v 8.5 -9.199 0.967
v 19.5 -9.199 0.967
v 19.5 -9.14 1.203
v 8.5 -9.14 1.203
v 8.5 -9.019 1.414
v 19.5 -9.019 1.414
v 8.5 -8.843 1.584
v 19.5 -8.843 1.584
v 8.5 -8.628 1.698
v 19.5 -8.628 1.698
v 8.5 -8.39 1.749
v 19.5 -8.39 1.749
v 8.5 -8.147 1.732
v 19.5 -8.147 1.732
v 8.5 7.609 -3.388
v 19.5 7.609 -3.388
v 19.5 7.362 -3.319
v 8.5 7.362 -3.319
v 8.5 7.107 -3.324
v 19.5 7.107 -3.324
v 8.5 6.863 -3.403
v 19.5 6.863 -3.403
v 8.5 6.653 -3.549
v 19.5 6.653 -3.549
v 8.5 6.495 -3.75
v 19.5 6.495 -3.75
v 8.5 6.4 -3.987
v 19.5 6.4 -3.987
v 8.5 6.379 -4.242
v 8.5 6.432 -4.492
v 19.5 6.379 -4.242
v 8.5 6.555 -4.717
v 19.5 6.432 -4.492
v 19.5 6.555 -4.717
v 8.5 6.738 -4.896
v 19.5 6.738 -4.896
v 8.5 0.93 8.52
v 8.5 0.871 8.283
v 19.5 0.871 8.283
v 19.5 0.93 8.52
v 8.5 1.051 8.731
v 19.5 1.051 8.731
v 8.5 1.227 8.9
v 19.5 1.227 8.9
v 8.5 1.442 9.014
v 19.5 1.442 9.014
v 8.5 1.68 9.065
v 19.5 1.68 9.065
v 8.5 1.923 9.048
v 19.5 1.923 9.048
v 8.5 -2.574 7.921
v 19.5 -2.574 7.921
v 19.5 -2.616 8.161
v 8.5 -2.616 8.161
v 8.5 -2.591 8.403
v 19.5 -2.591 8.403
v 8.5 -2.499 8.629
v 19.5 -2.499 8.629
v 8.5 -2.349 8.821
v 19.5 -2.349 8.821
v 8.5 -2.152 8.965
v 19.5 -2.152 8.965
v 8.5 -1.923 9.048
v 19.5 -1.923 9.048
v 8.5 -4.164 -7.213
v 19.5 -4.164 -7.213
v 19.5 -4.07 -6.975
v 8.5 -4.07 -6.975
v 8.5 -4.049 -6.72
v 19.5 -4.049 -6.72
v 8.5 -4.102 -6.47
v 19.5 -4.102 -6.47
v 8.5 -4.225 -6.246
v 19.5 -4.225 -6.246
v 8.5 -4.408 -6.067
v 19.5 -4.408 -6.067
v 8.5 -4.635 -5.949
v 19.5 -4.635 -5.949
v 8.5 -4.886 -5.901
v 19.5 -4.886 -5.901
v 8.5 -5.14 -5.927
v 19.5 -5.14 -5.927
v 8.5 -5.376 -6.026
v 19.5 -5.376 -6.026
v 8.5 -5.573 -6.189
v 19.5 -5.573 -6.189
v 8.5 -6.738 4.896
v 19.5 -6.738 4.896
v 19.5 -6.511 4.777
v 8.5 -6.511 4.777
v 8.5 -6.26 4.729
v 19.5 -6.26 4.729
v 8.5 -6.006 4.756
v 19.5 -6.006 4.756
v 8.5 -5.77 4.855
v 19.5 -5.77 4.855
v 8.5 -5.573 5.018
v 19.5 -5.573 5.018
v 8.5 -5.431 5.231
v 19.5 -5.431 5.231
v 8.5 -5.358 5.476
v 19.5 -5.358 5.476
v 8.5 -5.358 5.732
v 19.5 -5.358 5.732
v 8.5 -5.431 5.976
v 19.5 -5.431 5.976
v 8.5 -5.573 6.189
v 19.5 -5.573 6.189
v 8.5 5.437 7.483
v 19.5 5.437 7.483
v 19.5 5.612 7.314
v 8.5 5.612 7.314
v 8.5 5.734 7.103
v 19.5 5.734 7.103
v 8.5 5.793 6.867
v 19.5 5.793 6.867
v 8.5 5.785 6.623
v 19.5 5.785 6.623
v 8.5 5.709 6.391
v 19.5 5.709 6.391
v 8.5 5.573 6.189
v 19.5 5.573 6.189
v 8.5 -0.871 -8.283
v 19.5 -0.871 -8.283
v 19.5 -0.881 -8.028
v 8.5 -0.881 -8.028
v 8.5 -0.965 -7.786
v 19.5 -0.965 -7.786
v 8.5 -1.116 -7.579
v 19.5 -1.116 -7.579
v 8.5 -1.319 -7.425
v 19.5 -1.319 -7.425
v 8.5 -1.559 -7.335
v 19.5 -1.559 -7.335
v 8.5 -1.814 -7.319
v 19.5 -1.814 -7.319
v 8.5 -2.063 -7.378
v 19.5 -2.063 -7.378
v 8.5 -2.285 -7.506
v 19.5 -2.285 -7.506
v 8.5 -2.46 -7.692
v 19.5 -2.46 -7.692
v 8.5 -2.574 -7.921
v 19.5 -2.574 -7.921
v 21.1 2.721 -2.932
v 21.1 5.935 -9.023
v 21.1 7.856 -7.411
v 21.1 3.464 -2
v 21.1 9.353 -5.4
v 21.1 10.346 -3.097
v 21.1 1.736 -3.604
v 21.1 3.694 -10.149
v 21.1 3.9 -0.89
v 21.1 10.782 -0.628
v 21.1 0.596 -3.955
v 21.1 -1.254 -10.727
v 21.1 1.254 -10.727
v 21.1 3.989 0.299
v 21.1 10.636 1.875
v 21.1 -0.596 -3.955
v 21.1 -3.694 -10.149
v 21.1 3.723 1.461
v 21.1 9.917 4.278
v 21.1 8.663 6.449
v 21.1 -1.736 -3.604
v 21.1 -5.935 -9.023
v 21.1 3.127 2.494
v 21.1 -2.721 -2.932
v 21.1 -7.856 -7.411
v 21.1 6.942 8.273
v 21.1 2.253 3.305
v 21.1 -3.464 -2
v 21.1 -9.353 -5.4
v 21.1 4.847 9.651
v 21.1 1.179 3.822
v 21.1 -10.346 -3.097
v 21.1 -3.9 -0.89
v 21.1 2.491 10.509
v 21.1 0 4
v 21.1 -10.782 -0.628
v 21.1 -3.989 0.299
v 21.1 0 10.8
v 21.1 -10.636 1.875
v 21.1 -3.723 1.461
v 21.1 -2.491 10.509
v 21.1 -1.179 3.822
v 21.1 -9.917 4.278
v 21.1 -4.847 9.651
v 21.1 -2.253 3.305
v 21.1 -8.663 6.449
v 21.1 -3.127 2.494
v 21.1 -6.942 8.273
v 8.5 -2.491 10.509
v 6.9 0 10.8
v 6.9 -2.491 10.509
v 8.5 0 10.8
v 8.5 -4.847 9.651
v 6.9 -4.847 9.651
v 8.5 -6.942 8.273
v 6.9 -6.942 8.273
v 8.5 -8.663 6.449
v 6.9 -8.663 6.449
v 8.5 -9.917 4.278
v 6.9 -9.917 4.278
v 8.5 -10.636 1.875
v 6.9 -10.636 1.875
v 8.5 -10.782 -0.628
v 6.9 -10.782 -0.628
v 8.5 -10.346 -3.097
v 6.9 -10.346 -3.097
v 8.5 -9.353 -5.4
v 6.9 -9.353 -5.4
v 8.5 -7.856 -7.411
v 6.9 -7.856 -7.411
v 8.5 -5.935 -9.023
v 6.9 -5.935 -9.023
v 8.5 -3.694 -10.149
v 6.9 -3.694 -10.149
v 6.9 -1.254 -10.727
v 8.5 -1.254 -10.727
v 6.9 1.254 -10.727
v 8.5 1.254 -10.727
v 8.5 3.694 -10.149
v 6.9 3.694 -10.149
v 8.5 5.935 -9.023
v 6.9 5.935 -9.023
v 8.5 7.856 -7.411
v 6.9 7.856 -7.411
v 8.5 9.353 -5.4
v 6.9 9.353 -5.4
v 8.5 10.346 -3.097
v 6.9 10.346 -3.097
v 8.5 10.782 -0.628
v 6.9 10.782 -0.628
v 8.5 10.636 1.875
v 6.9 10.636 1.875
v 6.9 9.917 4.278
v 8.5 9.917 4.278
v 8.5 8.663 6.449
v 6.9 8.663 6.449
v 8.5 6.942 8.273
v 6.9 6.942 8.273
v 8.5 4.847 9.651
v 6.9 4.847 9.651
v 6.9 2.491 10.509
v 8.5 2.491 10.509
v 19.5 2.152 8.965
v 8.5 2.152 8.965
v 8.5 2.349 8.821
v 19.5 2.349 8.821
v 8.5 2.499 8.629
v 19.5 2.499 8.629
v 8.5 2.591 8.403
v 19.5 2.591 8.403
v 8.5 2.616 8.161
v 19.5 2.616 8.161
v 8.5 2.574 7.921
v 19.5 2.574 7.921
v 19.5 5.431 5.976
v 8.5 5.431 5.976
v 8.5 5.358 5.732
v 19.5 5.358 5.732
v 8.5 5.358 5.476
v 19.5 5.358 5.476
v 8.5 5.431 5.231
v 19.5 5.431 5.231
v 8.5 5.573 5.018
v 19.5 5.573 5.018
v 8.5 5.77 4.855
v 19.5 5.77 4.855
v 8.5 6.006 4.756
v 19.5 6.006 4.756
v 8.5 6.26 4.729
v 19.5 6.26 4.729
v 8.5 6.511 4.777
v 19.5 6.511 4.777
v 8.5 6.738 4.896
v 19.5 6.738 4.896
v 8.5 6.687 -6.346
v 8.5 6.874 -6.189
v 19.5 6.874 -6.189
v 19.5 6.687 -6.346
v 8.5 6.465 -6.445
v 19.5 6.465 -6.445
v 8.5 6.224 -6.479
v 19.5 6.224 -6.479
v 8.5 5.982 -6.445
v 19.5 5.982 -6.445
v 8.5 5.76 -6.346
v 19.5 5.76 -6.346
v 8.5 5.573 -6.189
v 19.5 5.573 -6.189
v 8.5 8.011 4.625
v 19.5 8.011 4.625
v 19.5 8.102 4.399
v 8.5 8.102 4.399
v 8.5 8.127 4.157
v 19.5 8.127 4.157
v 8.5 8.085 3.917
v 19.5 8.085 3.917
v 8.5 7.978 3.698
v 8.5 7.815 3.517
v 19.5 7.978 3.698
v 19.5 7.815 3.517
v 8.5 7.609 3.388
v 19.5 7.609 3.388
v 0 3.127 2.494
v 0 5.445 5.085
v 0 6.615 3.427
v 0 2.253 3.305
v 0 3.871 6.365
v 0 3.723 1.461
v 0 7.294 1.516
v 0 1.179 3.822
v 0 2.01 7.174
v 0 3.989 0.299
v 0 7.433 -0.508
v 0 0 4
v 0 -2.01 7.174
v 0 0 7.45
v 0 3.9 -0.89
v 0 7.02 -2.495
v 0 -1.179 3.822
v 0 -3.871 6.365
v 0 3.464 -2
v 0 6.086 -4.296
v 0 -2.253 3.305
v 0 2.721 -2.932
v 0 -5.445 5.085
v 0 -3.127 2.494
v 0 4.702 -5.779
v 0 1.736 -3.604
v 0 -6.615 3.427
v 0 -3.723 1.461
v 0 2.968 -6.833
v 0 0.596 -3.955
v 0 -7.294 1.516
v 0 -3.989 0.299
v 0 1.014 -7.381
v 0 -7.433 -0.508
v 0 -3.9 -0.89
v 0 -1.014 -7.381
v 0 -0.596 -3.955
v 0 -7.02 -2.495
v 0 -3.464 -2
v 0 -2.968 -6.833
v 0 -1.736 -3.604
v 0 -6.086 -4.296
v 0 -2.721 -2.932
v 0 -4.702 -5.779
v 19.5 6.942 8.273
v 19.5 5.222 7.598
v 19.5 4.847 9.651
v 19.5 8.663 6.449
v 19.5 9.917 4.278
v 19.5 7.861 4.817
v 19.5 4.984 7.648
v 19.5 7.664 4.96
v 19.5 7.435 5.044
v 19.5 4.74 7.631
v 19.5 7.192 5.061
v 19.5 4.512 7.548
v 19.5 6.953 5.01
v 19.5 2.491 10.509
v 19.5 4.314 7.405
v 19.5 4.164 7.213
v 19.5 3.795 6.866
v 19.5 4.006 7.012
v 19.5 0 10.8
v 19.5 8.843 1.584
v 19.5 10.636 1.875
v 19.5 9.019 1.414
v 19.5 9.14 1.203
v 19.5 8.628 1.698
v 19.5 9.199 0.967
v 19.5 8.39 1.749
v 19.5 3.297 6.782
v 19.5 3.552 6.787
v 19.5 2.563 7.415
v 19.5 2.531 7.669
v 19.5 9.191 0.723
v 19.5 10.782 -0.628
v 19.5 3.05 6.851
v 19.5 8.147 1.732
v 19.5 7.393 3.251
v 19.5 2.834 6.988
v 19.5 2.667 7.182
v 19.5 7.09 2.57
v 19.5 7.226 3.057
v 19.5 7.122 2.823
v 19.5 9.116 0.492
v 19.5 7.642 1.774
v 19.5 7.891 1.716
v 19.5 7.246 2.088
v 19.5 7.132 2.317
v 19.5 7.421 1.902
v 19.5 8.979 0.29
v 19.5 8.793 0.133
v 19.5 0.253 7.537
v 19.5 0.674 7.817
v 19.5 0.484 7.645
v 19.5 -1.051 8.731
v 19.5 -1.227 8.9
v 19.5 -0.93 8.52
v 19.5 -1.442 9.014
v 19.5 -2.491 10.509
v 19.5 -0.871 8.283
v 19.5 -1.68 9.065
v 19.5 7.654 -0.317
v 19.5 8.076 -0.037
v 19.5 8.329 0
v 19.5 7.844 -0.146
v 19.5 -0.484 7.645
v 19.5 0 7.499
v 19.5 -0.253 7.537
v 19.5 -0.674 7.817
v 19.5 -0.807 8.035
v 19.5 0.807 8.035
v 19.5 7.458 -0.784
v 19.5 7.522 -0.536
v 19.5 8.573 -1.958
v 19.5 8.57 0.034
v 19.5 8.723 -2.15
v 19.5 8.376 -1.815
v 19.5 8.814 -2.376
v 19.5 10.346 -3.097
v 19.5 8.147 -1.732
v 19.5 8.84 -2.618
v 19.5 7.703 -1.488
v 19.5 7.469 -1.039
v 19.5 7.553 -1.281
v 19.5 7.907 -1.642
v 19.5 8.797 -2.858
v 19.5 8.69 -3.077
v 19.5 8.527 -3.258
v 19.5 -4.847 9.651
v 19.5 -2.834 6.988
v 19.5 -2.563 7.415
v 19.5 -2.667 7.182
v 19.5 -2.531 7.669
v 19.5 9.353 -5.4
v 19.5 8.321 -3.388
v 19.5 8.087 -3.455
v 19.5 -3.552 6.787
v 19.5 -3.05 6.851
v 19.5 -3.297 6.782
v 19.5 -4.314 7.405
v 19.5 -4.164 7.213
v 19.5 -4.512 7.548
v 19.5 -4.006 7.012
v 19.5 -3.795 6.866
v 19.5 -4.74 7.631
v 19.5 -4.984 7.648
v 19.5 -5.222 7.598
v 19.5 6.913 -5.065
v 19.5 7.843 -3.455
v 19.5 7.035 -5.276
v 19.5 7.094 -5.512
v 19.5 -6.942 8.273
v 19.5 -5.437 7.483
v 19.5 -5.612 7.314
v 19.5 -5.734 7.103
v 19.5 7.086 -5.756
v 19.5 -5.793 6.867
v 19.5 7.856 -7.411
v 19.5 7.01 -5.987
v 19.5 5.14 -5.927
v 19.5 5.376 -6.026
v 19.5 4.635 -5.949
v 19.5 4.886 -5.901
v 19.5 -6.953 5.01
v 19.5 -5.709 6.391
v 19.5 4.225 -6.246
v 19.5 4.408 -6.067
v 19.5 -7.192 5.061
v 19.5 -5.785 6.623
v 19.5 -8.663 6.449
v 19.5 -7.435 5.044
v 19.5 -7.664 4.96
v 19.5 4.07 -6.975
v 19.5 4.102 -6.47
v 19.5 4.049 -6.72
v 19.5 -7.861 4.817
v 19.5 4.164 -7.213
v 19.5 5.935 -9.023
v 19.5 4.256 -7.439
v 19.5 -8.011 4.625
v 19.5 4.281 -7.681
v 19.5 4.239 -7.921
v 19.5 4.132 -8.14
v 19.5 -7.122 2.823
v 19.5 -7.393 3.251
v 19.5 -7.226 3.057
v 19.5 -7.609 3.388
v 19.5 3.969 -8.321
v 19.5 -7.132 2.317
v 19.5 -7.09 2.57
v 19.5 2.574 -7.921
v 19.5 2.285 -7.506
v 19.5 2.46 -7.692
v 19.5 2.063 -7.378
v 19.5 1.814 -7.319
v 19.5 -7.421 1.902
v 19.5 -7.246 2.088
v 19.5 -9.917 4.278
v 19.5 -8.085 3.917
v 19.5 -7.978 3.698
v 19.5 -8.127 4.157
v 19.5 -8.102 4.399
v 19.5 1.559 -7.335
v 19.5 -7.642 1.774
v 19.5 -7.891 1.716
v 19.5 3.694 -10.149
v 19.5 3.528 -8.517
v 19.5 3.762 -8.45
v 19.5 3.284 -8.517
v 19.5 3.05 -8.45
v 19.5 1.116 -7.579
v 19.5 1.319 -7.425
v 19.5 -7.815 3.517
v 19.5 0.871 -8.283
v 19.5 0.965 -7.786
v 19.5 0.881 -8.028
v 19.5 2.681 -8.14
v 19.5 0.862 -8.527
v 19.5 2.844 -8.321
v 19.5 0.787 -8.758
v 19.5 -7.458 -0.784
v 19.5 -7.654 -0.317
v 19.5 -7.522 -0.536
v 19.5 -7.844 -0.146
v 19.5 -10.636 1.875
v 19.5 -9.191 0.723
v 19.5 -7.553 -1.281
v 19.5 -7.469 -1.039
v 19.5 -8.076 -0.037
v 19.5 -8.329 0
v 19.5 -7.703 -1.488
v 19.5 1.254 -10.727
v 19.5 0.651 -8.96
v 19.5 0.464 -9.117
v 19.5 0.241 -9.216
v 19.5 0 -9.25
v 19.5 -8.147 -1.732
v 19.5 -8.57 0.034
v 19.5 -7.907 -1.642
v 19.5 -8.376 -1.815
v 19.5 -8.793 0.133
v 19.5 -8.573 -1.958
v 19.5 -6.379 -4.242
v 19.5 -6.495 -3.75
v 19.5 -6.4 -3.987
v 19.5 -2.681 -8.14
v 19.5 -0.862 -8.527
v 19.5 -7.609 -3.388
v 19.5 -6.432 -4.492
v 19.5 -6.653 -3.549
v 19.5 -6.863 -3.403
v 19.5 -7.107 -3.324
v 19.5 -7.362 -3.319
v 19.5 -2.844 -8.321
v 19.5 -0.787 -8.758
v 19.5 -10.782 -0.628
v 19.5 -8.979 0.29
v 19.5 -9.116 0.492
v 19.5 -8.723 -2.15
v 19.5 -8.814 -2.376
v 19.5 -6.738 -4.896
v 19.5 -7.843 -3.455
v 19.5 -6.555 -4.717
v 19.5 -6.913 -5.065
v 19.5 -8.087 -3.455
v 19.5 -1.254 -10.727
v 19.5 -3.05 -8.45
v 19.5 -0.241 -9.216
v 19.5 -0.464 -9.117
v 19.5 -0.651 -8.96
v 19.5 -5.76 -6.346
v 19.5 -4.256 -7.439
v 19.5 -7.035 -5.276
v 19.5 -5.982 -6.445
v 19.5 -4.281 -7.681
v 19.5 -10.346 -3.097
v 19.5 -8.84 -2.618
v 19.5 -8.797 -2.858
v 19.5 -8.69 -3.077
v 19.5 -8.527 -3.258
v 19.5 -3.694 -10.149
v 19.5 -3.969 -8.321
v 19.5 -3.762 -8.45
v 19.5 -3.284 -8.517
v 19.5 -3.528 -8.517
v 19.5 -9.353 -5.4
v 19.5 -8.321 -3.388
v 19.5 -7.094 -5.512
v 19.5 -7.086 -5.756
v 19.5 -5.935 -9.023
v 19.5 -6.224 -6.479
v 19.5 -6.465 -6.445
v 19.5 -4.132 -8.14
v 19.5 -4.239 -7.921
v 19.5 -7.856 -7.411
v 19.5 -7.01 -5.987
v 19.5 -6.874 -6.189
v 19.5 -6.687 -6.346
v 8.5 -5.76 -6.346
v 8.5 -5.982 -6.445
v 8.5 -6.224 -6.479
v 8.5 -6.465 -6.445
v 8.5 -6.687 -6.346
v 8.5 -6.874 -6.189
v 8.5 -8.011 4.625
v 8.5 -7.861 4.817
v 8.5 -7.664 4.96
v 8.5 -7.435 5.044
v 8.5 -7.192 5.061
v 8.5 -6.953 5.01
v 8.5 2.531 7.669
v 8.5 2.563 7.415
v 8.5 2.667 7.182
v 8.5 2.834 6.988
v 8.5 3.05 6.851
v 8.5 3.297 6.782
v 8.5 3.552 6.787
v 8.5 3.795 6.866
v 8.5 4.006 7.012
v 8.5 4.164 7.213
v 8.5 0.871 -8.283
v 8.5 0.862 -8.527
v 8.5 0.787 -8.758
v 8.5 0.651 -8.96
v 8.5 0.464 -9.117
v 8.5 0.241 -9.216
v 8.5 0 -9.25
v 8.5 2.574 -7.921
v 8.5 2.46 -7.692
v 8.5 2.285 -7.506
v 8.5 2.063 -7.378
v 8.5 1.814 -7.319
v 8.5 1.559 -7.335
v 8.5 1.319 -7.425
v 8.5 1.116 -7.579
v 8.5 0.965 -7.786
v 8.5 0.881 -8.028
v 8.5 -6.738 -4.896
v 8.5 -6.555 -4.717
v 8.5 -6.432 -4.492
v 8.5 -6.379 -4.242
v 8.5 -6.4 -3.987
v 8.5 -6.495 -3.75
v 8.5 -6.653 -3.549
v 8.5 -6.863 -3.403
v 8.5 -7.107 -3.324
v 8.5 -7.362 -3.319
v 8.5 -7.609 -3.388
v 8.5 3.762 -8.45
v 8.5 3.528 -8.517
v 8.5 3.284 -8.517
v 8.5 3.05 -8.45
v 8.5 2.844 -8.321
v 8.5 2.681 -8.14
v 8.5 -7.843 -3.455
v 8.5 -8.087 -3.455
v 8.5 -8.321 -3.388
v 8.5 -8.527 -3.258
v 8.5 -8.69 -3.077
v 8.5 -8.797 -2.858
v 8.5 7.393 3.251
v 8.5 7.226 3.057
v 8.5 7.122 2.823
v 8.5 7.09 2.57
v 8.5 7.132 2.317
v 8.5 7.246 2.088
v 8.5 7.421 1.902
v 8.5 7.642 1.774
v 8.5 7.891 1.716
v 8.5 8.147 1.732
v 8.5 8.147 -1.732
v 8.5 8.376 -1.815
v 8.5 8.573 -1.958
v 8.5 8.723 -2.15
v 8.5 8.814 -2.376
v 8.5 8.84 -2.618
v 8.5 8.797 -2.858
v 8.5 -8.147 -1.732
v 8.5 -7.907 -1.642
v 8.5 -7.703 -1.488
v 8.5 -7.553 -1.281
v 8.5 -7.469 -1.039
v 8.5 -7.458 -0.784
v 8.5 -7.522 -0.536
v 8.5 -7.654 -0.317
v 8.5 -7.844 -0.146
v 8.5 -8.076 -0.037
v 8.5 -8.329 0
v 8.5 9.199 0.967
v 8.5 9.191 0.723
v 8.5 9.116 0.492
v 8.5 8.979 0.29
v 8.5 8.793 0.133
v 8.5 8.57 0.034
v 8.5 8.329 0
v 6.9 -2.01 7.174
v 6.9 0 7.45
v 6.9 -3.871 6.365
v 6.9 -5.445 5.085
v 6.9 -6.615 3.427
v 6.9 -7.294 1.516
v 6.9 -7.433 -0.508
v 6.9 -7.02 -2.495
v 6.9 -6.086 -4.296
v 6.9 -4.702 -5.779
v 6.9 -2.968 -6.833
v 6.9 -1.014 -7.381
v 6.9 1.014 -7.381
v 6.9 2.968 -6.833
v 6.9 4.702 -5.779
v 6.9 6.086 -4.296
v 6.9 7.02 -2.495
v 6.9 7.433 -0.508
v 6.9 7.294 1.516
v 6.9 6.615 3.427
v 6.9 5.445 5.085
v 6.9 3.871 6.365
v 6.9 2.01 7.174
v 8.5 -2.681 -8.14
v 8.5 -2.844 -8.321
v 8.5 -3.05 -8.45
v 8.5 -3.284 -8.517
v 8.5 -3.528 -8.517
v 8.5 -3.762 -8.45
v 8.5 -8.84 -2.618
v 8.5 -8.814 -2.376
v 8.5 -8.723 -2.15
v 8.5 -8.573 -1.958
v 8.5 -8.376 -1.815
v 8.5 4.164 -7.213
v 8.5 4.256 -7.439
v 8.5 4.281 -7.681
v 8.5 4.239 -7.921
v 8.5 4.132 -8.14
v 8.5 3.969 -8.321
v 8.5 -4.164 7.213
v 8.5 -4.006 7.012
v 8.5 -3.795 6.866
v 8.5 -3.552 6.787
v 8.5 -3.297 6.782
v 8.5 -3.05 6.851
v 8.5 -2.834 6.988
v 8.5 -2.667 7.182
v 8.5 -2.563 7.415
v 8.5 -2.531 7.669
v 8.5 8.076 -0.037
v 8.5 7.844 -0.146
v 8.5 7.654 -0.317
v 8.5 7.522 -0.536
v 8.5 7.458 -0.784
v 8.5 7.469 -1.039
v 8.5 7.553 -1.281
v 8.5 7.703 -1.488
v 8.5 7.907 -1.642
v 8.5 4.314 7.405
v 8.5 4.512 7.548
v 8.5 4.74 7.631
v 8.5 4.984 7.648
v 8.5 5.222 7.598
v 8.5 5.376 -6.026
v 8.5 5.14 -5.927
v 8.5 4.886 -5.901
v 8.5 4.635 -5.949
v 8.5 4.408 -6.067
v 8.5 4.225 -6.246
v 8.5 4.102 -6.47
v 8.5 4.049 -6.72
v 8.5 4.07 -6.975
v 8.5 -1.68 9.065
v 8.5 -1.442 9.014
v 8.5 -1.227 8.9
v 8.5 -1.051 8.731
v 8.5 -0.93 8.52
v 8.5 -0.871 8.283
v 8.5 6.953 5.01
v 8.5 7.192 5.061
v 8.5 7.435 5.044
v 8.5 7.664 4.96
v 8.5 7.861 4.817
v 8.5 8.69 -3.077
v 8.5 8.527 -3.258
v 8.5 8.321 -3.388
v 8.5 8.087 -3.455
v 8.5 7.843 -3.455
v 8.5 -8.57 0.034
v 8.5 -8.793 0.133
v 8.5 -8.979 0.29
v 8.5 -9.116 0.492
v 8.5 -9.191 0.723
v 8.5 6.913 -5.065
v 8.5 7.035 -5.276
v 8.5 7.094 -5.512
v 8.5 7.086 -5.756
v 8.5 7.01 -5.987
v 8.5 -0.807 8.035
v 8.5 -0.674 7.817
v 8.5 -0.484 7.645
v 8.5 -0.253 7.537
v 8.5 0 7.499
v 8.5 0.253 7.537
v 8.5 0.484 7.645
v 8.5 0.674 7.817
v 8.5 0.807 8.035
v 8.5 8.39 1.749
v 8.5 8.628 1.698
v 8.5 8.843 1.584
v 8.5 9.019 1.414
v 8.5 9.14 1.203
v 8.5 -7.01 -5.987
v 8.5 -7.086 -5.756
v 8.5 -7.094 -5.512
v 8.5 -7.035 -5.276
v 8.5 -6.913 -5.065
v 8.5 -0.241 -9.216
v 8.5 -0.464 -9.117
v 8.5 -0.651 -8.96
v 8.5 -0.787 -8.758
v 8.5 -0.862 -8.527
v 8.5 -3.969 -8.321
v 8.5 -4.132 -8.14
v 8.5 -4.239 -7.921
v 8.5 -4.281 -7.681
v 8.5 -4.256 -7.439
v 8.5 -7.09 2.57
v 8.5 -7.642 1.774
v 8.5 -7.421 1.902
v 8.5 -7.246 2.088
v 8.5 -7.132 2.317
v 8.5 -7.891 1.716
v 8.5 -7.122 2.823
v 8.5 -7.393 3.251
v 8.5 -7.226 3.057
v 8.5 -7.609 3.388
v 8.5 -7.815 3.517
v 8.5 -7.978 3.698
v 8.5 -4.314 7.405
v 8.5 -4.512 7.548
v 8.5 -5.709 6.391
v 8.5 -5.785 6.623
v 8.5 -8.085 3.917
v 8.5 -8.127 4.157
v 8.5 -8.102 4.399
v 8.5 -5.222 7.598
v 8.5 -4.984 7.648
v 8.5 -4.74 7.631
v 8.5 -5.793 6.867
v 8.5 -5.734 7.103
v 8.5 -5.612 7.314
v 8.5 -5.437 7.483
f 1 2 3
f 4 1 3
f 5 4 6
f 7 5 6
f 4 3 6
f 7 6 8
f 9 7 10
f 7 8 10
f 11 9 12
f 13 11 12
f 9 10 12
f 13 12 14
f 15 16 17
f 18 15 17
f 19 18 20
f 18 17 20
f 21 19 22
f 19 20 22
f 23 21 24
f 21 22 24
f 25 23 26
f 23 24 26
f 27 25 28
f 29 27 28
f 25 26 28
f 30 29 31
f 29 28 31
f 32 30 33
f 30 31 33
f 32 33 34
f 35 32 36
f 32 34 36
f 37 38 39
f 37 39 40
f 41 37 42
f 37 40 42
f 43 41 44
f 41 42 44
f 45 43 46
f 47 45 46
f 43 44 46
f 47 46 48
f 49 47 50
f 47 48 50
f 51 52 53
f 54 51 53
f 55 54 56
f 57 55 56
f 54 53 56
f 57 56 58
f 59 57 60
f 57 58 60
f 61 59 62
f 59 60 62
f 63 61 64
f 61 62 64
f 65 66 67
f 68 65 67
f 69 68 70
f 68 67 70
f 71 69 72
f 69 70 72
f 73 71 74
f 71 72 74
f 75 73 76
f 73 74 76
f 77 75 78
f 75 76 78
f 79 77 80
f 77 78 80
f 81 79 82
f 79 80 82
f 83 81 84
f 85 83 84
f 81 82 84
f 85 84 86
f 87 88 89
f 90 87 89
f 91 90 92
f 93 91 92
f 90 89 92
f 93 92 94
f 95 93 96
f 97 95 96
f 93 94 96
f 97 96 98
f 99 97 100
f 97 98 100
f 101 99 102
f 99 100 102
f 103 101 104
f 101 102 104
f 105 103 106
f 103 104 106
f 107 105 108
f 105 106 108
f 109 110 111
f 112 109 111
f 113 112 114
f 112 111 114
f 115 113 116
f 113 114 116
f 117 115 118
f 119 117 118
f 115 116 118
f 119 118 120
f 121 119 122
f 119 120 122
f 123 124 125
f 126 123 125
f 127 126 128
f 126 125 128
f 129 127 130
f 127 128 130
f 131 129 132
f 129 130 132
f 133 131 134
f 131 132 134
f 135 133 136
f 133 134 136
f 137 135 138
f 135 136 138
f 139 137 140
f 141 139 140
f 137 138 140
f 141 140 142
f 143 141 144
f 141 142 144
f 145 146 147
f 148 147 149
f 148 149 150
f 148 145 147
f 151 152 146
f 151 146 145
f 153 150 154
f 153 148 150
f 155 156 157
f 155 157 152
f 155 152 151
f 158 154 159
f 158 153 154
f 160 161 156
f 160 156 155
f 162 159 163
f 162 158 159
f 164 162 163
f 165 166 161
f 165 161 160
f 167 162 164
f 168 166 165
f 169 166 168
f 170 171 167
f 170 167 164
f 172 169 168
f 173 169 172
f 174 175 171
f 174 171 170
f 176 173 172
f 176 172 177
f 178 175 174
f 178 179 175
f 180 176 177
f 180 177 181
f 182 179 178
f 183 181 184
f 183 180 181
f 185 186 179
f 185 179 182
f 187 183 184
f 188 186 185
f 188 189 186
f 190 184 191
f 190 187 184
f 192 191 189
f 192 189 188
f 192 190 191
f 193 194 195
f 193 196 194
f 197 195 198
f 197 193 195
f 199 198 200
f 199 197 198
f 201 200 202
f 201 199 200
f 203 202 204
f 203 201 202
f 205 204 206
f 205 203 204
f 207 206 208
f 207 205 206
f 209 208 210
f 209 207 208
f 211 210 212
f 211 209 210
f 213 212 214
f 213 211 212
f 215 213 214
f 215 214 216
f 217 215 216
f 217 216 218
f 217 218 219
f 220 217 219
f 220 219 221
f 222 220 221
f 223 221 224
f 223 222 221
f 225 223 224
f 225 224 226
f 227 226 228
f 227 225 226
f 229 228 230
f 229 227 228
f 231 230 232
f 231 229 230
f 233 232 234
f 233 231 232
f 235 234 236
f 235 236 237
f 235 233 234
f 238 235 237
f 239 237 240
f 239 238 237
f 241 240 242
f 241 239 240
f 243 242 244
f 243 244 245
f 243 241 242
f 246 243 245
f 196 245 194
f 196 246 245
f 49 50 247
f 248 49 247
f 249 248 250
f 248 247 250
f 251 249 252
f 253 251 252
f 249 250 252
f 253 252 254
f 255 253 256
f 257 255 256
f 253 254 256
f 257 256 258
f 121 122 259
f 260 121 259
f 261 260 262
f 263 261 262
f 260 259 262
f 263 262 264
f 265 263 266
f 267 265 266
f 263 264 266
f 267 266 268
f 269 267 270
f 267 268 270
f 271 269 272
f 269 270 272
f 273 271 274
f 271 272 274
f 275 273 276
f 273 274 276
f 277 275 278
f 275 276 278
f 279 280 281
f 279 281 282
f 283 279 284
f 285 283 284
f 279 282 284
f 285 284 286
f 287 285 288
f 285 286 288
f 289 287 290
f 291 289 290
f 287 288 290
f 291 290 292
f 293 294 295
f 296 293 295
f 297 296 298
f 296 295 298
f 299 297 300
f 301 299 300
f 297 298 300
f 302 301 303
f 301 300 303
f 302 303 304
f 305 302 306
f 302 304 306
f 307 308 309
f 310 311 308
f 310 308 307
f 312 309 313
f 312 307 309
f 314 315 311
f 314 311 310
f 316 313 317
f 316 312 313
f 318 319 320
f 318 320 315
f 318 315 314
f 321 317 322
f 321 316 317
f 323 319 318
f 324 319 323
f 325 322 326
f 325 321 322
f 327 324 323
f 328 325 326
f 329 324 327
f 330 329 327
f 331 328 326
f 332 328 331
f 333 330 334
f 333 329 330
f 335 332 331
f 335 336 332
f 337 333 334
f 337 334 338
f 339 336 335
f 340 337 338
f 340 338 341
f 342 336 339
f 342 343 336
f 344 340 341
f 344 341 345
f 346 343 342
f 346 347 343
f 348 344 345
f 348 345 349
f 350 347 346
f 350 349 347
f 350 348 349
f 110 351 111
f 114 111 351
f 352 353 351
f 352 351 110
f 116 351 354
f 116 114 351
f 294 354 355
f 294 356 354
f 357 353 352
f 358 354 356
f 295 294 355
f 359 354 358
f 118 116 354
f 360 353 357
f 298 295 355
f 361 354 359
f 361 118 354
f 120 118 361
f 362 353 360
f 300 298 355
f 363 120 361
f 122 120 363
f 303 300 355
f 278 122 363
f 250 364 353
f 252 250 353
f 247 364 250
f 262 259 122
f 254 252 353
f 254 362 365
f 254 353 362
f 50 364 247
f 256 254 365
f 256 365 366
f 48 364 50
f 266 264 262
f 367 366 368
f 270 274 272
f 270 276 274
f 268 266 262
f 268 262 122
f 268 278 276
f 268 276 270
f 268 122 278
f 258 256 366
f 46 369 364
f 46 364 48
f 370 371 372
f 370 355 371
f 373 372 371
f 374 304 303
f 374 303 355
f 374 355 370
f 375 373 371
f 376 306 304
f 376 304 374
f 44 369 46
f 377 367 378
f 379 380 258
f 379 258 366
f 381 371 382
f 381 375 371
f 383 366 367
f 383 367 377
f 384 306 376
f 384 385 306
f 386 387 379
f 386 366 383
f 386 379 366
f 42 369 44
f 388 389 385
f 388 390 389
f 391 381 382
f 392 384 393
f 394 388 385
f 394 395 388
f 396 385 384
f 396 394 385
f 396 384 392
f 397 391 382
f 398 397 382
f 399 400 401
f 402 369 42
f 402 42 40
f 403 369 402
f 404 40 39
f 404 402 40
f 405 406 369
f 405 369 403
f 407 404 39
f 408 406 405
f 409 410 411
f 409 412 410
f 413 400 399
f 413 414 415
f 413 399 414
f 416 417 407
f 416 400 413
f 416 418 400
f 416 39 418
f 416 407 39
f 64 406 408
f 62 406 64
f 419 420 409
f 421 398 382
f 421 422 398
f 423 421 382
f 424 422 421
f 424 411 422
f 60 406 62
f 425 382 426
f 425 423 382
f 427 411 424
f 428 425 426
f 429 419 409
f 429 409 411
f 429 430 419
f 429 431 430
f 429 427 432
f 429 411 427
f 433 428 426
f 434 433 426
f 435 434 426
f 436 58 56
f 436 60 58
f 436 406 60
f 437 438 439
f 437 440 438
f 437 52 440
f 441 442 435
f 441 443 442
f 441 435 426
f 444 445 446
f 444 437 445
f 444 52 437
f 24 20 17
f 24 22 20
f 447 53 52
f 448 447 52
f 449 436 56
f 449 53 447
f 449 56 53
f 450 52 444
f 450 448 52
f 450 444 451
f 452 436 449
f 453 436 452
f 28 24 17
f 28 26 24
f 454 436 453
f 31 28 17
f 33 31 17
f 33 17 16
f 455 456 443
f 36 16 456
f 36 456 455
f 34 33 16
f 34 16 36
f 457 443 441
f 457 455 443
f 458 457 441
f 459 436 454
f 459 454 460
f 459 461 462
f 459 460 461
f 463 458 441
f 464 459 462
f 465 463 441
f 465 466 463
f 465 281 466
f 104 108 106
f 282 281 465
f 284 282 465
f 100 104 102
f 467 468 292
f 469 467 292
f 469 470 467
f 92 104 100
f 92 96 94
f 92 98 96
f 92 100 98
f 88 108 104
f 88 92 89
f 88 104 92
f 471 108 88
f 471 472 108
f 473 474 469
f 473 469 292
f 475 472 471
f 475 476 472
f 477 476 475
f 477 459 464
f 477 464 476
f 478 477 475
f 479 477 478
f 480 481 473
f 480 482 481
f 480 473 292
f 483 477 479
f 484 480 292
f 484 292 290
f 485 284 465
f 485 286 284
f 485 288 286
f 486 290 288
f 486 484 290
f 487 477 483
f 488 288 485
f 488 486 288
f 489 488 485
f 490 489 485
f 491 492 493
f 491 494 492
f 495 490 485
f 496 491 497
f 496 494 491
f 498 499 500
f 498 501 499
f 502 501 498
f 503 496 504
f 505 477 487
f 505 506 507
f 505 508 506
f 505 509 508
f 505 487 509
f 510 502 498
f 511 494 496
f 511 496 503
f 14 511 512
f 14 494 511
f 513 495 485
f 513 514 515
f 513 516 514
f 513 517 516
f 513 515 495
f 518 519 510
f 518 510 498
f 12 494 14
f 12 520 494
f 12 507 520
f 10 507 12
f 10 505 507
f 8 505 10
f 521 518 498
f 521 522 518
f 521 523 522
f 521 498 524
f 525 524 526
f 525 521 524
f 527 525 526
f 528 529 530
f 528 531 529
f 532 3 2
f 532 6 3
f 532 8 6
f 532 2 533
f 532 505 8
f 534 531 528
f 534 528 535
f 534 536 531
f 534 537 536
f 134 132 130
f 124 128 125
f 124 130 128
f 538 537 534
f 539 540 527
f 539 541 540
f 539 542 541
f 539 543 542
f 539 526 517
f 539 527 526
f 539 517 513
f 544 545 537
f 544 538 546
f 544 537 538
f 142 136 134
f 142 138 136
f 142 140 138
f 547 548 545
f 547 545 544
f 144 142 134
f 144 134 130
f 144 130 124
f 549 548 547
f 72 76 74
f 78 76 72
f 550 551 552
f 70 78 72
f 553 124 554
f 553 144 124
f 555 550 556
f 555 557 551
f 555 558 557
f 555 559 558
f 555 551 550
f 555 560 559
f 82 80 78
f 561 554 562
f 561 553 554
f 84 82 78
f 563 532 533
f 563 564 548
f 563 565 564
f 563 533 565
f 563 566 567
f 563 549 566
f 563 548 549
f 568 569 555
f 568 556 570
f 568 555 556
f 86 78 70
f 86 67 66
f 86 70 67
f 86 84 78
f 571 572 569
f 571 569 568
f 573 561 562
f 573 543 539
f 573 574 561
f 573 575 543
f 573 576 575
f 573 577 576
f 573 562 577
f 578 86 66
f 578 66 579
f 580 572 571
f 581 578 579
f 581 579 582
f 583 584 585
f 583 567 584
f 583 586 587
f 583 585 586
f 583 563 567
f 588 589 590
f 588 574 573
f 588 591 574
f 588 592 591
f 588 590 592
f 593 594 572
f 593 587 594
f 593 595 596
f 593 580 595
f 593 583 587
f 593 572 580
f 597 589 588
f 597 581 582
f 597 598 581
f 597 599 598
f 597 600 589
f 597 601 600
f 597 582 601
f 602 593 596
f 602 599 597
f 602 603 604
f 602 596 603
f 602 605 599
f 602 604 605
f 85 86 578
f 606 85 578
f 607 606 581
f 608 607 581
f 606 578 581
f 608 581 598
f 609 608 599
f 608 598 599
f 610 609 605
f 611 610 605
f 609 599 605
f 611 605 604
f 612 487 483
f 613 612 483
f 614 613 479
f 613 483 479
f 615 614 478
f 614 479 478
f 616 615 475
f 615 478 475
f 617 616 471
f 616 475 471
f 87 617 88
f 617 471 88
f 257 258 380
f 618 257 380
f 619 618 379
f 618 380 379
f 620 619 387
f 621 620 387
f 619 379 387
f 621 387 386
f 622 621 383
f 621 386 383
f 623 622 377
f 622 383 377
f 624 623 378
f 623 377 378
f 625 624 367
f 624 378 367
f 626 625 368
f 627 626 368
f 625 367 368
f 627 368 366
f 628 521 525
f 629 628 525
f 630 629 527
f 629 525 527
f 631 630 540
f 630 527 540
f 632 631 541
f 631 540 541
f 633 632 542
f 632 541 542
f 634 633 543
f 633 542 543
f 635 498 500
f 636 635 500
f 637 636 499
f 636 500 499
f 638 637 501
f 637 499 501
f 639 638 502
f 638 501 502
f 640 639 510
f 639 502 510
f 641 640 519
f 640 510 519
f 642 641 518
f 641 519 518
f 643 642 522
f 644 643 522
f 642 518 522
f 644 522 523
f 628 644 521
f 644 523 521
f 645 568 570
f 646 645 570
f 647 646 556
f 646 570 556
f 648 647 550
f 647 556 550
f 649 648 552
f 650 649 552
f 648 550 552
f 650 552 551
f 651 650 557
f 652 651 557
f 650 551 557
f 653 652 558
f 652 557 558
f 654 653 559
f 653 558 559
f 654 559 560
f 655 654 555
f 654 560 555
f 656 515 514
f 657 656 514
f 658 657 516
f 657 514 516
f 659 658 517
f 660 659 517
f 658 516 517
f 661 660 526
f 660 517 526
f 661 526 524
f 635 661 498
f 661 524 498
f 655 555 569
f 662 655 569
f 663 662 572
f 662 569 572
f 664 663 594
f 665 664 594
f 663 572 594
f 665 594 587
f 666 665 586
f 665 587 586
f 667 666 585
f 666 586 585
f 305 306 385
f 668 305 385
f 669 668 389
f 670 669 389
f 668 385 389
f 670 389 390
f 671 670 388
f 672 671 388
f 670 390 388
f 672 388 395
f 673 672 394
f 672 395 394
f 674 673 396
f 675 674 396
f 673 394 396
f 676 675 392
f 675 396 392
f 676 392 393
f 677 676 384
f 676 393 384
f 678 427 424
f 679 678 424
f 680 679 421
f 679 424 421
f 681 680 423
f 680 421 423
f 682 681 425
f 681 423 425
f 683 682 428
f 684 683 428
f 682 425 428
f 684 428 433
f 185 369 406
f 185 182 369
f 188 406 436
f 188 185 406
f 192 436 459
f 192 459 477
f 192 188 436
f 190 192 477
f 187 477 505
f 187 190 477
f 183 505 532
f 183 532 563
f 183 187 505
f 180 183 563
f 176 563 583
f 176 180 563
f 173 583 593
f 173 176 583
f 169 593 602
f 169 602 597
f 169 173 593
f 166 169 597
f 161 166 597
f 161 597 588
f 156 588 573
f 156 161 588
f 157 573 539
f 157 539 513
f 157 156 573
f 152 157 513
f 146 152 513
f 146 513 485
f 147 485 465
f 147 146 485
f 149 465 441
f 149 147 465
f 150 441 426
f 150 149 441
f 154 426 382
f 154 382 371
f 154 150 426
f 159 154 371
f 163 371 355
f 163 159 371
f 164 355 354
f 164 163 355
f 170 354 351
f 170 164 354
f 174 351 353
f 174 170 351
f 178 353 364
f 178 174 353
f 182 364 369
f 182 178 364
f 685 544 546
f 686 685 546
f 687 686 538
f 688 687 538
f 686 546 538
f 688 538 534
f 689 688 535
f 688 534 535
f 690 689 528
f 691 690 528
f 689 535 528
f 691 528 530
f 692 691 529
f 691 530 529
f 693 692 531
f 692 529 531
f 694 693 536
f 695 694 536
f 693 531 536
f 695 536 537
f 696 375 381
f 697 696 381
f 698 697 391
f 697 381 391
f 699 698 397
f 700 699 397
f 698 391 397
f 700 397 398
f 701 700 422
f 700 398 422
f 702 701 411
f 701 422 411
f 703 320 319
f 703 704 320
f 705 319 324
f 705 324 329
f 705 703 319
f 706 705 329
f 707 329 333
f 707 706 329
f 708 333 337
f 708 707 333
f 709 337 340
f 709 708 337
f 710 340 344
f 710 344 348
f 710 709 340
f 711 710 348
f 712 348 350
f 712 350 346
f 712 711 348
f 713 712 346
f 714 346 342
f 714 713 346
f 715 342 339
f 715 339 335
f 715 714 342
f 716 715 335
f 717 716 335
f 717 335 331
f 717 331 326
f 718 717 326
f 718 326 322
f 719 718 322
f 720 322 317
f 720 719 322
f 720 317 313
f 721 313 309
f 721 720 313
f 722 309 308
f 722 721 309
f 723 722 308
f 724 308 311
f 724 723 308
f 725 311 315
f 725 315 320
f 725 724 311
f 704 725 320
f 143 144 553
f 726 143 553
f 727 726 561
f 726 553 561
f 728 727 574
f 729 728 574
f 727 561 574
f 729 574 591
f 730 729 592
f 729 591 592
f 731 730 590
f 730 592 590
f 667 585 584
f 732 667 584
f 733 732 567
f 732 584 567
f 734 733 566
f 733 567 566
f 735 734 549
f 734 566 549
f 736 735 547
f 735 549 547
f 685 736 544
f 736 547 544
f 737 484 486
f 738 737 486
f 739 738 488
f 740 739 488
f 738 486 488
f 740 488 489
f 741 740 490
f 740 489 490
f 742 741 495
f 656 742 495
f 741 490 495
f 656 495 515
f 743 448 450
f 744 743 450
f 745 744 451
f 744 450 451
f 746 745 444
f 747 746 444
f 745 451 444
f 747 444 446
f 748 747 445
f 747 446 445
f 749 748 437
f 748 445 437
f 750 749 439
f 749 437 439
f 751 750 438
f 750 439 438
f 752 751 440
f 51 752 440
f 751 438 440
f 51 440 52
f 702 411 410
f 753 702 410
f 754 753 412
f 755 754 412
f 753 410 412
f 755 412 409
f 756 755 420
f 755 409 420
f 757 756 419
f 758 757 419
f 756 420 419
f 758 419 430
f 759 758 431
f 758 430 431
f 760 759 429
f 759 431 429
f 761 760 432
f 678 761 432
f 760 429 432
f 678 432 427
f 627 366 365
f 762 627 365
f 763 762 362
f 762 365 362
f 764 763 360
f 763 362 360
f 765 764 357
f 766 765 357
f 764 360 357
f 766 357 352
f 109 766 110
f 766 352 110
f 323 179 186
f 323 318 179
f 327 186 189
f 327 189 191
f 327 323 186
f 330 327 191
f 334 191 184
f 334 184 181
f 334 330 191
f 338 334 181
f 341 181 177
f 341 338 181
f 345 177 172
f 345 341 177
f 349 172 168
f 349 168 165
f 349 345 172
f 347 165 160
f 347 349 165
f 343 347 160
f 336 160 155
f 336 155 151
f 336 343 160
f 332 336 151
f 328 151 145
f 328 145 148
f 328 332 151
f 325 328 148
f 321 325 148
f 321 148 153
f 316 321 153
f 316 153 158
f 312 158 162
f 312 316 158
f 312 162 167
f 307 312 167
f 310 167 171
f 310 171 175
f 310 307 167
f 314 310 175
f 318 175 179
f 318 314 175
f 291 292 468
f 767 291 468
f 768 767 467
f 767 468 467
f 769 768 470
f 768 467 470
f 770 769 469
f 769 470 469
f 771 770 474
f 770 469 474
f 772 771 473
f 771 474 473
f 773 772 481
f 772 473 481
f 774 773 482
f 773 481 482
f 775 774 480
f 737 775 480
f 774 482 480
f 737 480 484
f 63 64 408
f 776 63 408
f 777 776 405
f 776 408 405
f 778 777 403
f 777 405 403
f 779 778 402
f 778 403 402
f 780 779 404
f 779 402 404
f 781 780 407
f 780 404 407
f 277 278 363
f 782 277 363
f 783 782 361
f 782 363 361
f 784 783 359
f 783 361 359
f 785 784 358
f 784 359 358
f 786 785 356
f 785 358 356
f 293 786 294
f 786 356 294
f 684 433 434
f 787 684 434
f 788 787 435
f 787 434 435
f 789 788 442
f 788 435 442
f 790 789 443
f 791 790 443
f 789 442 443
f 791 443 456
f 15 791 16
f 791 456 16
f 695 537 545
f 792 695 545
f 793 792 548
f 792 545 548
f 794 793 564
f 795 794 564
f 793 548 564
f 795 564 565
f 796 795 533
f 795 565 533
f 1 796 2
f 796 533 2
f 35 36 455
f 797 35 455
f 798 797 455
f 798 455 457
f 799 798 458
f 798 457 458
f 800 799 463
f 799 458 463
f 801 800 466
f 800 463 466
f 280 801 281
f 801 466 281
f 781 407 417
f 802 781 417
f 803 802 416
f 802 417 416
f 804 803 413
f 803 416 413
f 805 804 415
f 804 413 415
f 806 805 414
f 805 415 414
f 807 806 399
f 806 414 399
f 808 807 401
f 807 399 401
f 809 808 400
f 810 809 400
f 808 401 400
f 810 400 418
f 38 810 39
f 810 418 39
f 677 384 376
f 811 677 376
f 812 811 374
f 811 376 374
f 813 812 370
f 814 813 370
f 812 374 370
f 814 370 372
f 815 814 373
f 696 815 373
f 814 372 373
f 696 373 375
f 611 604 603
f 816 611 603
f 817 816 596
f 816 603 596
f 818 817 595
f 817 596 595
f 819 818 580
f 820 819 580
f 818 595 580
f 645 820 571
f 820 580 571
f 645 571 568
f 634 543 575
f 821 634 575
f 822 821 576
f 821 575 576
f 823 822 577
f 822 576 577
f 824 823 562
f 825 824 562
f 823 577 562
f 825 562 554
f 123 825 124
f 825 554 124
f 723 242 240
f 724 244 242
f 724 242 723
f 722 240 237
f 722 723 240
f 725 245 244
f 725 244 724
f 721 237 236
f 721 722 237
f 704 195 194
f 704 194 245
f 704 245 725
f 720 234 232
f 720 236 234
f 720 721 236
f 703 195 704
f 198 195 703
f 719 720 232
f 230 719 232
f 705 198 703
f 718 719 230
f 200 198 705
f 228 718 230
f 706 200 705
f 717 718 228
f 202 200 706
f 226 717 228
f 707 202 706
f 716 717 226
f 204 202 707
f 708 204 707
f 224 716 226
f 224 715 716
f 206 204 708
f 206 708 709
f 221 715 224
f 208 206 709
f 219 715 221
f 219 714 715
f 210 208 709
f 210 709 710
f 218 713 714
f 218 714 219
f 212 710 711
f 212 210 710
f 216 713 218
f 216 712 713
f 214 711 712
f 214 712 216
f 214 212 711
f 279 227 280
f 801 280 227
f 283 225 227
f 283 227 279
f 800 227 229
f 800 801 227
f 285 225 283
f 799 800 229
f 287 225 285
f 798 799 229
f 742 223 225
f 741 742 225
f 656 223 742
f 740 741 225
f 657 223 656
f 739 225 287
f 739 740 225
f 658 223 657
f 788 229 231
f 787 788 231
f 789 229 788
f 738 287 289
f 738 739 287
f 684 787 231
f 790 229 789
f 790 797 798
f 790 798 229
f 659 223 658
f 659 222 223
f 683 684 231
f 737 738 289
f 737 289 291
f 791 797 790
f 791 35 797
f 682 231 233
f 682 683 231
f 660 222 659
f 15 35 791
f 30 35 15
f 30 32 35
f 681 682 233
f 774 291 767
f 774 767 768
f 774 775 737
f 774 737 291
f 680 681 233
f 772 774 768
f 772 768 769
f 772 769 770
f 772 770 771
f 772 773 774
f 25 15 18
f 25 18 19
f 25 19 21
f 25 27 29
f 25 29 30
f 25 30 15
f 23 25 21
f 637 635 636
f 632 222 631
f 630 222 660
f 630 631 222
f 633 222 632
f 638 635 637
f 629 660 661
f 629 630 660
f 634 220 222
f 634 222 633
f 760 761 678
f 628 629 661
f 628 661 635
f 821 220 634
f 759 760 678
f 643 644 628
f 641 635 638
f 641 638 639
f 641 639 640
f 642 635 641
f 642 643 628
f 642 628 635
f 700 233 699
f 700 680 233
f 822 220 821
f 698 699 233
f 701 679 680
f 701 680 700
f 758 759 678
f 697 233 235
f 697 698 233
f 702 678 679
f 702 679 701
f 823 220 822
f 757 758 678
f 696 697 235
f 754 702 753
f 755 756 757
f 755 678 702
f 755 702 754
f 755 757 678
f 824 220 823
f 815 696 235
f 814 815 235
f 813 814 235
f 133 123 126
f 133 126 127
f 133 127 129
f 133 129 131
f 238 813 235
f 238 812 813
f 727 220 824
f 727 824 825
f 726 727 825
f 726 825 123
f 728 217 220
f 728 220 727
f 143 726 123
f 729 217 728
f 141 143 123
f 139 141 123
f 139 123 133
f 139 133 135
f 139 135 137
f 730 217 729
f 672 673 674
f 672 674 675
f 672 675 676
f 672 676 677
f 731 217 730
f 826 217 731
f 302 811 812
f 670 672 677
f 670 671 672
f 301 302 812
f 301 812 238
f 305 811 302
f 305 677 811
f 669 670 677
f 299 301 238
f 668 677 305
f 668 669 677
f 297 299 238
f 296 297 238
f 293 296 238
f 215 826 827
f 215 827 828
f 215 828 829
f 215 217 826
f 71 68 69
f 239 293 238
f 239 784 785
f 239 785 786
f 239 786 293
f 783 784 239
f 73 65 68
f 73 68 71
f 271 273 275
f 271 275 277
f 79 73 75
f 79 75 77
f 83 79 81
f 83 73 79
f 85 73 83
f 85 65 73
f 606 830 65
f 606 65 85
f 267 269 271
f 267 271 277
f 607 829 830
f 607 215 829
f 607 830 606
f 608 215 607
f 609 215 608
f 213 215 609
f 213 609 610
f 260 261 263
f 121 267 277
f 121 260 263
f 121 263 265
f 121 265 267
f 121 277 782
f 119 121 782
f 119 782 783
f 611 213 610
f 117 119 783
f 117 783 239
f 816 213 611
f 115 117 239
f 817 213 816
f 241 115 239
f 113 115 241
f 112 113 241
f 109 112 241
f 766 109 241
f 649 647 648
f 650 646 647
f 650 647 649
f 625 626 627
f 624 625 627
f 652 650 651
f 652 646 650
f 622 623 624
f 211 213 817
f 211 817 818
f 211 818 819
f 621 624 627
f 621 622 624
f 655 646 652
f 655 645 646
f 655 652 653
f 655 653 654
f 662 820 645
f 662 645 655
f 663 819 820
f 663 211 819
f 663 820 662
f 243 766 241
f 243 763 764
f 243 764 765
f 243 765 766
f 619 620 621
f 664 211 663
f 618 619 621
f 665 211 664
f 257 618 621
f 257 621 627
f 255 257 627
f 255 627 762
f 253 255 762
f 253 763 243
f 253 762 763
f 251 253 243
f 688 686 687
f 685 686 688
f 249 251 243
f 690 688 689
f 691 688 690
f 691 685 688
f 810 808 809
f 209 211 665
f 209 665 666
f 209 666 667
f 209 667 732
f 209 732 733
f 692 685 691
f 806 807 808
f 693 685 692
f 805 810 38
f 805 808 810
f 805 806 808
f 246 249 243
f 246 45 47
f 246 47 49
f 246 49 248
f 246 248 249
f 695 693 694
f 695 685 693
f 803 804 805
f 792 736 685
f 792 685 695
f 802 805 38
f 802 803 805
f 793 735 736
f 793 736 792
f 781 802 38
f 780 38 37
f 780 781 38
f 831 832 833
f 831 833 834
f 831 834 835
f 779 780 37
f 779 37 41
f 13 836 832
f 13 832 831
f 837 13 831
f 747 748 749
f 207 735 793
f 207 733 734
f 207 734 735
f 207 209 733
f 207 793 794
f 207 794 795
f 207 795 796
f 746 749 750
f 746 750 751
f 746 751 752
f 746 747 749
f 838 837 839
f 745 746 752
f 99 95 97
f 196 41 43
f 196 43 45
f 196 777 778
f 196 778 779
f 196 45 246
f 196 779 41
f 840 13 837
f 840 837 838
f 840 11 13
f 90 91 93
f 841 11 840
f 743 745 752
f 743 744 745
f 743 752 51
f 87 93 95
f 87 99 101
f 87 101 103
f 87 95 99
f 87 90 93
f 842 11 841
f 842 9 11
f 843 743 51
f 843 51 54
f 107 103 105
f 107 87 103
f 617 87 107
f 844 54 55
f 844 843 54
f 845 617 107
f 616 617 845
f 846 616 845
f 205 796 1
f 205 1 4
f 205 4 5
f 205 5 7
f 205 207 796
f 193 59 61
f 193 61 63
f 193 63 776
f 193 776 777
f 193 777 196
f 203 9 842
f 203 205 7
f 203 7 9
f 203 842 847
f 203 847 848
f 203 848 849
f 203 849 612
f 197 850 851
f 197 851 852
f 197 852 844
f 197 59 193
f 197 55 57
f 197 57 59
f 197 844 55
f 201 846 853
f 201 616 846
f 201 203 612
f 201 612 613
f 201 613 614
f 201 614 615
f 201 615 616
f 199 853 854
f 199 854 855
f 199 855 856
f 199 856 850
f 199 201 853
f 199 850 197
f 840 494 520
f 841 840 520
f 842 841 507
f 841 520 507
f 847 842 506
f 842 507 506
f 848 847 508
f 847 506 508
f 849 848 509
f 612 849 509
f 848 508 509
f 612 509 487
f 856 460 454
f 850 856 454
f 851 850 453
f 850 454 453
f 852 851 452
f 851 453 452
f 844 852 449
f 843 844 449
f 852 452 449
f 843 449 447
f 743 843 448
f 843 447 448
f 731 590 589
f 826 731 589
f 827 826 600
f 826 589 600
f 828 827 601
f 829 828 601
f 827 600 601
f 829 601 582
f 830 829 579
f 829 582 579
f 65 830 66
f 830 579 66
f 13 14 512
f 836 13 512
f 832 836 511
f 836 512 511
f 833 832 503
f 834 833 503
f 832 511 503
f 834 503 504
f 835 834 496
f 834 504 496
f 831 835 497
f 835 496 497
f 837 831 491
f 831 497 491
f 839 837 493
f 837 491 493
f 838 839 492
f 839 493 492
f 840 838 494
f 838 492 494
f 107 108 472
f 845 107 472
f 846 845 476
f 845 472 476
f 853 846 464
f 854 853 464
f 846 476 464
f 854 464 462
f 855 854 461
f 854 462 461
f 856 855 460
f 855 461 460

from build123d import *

# Parameters (mm, degrees)
CUT_EXTRUDE1_START = 11
CUT_EXTRUDE1_DEPTH = 11


with BuildPart() as part:
    # Sketch1 → Revolve2 (revolve)
    with BuildSketch(Plane.XY, mode=Mode.PRIVATE) as revolve2_sk:
        Polygon((0, 4), (0, 7.45), (6.9, 7.45), (6.9, 10.8), (8.5, 10.8), (8.5, 9.25), (19.5, 9.25), (19.5, 10.8), (21.1, 10.8), (21.1, 4), align=None)
    revolve(revolve2_sk.sketch.rotate(Axis((0, 0, 0), (1, 0, 0)), 90), axis=Axis((0, 0, 0), (1, 0, 0)))

    # Sketch4 → Cut-Extrude1 (cut)
    with BuildSketch(Plane(origin=(8.5, 0, 0), x_dir=(0, 0, -1), z_dir=(1, 0, 0)).offset(CUT_EXTRUDE1_START)):
        with BuildLine():
            ThreePointArc((7.212898178, 4.164368705), (7.921100382, 4.238803586), (8.450295822, 3.762313188))
            ThreePointArc((8.450295822, 3.762313188), (7.483407656, 5.437012953), (6.189458648, 6.87408915))
            ThreePointArc((6.189458648, 6.87408915), (6.479096404, 6.223551012), (6.189458109, 5.573013113))
            ThreePointArc((6.189458109, 5.573013113), (6.067003582, 4.40793612), (7.212898178, 4.164368705))
        make_face()
        with BuildLine():
            ThreePointArc((8.283111715, 0.870590122), (8.960361705, 0.650538261), (9.25, 0))
            ThreePointArc((9.25, 0), (9.047865393, 1.923182733), (8.450295822, 3.762313188))
            ThreePointArc((8.450295822, 3.762313188), (8.450295314, 3.050210787), (7.921099986, 2.573721401))
            ThreePointArc((7.921099986, 2.573721401), (7.335352705, 1.55917735), (8.283111715, 0.870590122))
        make_face()
        with BuildLine():
            ThreePointArc((8.450295822, -3.762313187), (9.047865393, -1.923182732), (9.25, 0))
            ThreePointArc((9.25, 0), (8.960361705, -0.650538261), (8.283111715, -0.870590122))
            ThreePointArc((8.283111715, -0.870590122), (7.335352705, -1.55917735), (7.921099986, -2.573721401))
            ThreePointArc((7.921099986, -2.573721401), (8.450295314, -3.050210786), (8.450295822, -3.762313187))
        make_face()
        with BuildLine():
            ThreePointArc((6.189458648, -6.87408915), (7.483407656, -5.437012953), (8.450295822, -3.762313187))
            ThreePointArc((8.450295822, -3.762313187), (7.921100382, -4.238803585), (7.212898178, -4.164368705))
            ThreePointArc((7.212898178, -4.164368705), (6.067003582, -4.40793612), (6.189458109, -5.573013113))
            ThreePointArc((6.189458109, -5.573013113), (6.479096404, -6.223551011), (6.189458648, -6.87408915))
        make_face()
        with BuildLine():
            ThreePointArc((2.858407704, -8.797272611), (4.625000545, -8.010734671), (6.189458648, -6.87408915))
            ThreePointArc((6.189458648, -6.87408915), (5.512208479, -7.094141535), (4.89550902, -6.738090106))
            ThreePointArc((4.89550902, -6.738090106), (3.749614424, -6.494522691), (3.387602695, -7.608680229))
            ThreePointArc((3.387602695, -7.608680229), (3.387602803, -8.320782767), (2.858407704, -8.797272611))
        make_face()
        with BuildLine():
            ThreePointArc((-0.966888273, -9.199327533), (0.966888556, -9.199327504), (2.858407704, -8.797272611))
            ThreePointArc((2.858407704, -8.797272611), (2.15020562, -8.722837899), (1.731641877, -8.146734514))
            ThreePointArc((1.731641877, -8.146734514), (0.783882867, -7.458147287), (0, -8.32873741))
            ThreePointArc((0, -8.32873741), (-0.28963829, -8.979275667), (-0.966888273, -9.199327533))
        make_face()
        with BuildLine():
            ThreePointArc((-4.625000007, -8.010734981), (-2.858407196, -8.797272776), (-0.966888273, -9.199327533))
            ThreePointArc((-0.966888273, -9.199327533), (-1.58358738, -8.843276147), (-1.731641877, -8.146734514))
            ThreePointArc((-1.731641877, -8.146734514), (-2.317389159, -7.132190463), (-3.387602695, -7.608680229))
            ThreePointArc((-3.387602695, -7.608680229), (-3.916798196, -8.085169996), (-4.625000007, -8.010734981))
        make_face()
        with BuildLine():
            ThreePointArc((-7.483407198, -5.437013584), (-6.189458111, -6.874089633), (-4.625000007, -8.010734981))
            ThreePointArc((-4.625000007, -8.010734981), (-5.043563514, -7.434631729), (-4.89550902, -6.738090106))
            ThreePointArc((-4.89550902, -6.738090106), (-5.017963546, -5.573013113), (-6.189458109, -5.573013113))
            ThreePointArc((-6.189458109, -5.573013113), (-6.866708099, -5.793064974), (-7.483407198, -5.437013584))
        make_face()
        with BuildLine():
            ThreePointArc((-9.047865313, -1.923183112), (-8.450295489, -3.762313935), (-7.483407198, -5.437013584))
            ThreePointArc((-7.483407198, -5.437013584), (-7.631461691, -4.740471957), (-7.212898178, -4.164368705))
            ThreePointArc((-7.212898178, -4.164368705), (-6.85088645, -3.050211167), (-7.921099986, -2.573721401))
            ThreePointArc((-7.921099986, -2.573721401), (-8.629301806, -2.499286385), (-9.047865313, -1.923183112))
        make_face()
        with BuildLine():
            ThreePointArc((-8.283111715, 0.870590122), (-8.899810818, 1.226641519), (-9.047865304, 1.923183154))
            ThreePointArc((-9.047865304, 1.923183154), (-9.25, 2.2e-08), (-9.047865313, -1.923183112))
            ThreePointArc((-9.047865313, -1.923183112), (-8.899810805, -1.226641501), (-8.283111715, -0.870590122))
            ThreePointArc((-8.283111715, -0.870590122), (-7.499228848, 0), (-8.283111715, 0.870590122))
        make_face()
        with BuildLine():
            ThreePointArc((-7.212898178, 4.164368705), (-7.631461691, 4.740471957), (-7.483407198, 5.437013584))
            ThreePointArc((-7.483407198, 5.437013584), (-8.45029548, 3.762313955), (-9.047865304, 1.923183154))
            ThreePointArc((-9.047865304, 1.923183154), (-8.629301788, 2.499286395), (-7.921099986, 2.573721401))
            ThreePointArc((-7.921099986, 2.573721401), (-6.85088645, 3.050211167), (-7.212898178, 4.164368705))
        make_face()
        with BuildLine():
            ThreePointArc((-4.89550902, 6.738090106), (-5.043563514, 7.434631729), (-4.625000007, 8.010734981))
            ThreePointArc((-4.625000007, 8.010734981), (-6.189458111, 6.874089633), (-7.483407198, 5.437013584))
            ThreePointArc((-7.483407198, 5.437013584), (-6.866708099, 5.793064974), (-6.189458109, 5.573013113))
            ThreePointArc((-6.189458109, 5.573013113), (-5.017963546, 5.573013113), (-4.89550902, 6.738090106))
        make_face()
        with BuildLine():
            ThreePointArc((-1.731641877, 8.146734514), (-1.583587386, 8.843276139), (-0.966888291, 9.199327532))
            ThreePointArc((-0.966888291, 9.199327532), (-2.858407204, 8.797272774), (-4.625000007, 8.010734981))
            ThreePointArc((-4.625000007, 8.010734981), (-3.916798196, 8.085169996), (-3.387602695, 7.608680229))
            ThreePointArc((-3.387602695, 7.608680229), (-2.317389159, 7.132190463), (-1.731641877, 8.146734514))
        make_face()
        with BuildLine():
            ThreePointArc((1.731641877, 8.146734514), (2.15020538, 8.72283776), (2.858407176, 8.797272783))
            ThreePointArc((2.858407176, 8.797272783), (0.966888271, 9.199327534), (-0.966888291, 9.199327532))
            ThreePointArc((-0.966888291, 9.199327532), (-0.289638297, 8.979275673), (0, 8.32873741))
            ThreePointArc((0, 8.32873741), (0.783882867, 7.458147287), (1.731641877, 8.146734514))
        make_face()
        with BuildLine():
            ThreePointArc((4.89550902, 6.738090106), (5.512208479, 7.094141535), (6.189458648, 6.87408915))
            ThreePointArc((6.189458648, 6.87408915), (4.625000304, 8.010734809), (2.858407176, 8.797272783))
            ThreePointArc((2.858407176, 8.797272783), (3.38760269, 8.320783021), (3.387602695, 7.608680229))
            ThreePointArc((3.387602695, 7.608680229), (3.749614424, 6.494522691), (4.89550902, 6.738090106))
        make_face()
    extrude(amount=-CUT_EXTRUDE1_DEPTH, mode=Mode.SUBTRACT)


solid = part.part
